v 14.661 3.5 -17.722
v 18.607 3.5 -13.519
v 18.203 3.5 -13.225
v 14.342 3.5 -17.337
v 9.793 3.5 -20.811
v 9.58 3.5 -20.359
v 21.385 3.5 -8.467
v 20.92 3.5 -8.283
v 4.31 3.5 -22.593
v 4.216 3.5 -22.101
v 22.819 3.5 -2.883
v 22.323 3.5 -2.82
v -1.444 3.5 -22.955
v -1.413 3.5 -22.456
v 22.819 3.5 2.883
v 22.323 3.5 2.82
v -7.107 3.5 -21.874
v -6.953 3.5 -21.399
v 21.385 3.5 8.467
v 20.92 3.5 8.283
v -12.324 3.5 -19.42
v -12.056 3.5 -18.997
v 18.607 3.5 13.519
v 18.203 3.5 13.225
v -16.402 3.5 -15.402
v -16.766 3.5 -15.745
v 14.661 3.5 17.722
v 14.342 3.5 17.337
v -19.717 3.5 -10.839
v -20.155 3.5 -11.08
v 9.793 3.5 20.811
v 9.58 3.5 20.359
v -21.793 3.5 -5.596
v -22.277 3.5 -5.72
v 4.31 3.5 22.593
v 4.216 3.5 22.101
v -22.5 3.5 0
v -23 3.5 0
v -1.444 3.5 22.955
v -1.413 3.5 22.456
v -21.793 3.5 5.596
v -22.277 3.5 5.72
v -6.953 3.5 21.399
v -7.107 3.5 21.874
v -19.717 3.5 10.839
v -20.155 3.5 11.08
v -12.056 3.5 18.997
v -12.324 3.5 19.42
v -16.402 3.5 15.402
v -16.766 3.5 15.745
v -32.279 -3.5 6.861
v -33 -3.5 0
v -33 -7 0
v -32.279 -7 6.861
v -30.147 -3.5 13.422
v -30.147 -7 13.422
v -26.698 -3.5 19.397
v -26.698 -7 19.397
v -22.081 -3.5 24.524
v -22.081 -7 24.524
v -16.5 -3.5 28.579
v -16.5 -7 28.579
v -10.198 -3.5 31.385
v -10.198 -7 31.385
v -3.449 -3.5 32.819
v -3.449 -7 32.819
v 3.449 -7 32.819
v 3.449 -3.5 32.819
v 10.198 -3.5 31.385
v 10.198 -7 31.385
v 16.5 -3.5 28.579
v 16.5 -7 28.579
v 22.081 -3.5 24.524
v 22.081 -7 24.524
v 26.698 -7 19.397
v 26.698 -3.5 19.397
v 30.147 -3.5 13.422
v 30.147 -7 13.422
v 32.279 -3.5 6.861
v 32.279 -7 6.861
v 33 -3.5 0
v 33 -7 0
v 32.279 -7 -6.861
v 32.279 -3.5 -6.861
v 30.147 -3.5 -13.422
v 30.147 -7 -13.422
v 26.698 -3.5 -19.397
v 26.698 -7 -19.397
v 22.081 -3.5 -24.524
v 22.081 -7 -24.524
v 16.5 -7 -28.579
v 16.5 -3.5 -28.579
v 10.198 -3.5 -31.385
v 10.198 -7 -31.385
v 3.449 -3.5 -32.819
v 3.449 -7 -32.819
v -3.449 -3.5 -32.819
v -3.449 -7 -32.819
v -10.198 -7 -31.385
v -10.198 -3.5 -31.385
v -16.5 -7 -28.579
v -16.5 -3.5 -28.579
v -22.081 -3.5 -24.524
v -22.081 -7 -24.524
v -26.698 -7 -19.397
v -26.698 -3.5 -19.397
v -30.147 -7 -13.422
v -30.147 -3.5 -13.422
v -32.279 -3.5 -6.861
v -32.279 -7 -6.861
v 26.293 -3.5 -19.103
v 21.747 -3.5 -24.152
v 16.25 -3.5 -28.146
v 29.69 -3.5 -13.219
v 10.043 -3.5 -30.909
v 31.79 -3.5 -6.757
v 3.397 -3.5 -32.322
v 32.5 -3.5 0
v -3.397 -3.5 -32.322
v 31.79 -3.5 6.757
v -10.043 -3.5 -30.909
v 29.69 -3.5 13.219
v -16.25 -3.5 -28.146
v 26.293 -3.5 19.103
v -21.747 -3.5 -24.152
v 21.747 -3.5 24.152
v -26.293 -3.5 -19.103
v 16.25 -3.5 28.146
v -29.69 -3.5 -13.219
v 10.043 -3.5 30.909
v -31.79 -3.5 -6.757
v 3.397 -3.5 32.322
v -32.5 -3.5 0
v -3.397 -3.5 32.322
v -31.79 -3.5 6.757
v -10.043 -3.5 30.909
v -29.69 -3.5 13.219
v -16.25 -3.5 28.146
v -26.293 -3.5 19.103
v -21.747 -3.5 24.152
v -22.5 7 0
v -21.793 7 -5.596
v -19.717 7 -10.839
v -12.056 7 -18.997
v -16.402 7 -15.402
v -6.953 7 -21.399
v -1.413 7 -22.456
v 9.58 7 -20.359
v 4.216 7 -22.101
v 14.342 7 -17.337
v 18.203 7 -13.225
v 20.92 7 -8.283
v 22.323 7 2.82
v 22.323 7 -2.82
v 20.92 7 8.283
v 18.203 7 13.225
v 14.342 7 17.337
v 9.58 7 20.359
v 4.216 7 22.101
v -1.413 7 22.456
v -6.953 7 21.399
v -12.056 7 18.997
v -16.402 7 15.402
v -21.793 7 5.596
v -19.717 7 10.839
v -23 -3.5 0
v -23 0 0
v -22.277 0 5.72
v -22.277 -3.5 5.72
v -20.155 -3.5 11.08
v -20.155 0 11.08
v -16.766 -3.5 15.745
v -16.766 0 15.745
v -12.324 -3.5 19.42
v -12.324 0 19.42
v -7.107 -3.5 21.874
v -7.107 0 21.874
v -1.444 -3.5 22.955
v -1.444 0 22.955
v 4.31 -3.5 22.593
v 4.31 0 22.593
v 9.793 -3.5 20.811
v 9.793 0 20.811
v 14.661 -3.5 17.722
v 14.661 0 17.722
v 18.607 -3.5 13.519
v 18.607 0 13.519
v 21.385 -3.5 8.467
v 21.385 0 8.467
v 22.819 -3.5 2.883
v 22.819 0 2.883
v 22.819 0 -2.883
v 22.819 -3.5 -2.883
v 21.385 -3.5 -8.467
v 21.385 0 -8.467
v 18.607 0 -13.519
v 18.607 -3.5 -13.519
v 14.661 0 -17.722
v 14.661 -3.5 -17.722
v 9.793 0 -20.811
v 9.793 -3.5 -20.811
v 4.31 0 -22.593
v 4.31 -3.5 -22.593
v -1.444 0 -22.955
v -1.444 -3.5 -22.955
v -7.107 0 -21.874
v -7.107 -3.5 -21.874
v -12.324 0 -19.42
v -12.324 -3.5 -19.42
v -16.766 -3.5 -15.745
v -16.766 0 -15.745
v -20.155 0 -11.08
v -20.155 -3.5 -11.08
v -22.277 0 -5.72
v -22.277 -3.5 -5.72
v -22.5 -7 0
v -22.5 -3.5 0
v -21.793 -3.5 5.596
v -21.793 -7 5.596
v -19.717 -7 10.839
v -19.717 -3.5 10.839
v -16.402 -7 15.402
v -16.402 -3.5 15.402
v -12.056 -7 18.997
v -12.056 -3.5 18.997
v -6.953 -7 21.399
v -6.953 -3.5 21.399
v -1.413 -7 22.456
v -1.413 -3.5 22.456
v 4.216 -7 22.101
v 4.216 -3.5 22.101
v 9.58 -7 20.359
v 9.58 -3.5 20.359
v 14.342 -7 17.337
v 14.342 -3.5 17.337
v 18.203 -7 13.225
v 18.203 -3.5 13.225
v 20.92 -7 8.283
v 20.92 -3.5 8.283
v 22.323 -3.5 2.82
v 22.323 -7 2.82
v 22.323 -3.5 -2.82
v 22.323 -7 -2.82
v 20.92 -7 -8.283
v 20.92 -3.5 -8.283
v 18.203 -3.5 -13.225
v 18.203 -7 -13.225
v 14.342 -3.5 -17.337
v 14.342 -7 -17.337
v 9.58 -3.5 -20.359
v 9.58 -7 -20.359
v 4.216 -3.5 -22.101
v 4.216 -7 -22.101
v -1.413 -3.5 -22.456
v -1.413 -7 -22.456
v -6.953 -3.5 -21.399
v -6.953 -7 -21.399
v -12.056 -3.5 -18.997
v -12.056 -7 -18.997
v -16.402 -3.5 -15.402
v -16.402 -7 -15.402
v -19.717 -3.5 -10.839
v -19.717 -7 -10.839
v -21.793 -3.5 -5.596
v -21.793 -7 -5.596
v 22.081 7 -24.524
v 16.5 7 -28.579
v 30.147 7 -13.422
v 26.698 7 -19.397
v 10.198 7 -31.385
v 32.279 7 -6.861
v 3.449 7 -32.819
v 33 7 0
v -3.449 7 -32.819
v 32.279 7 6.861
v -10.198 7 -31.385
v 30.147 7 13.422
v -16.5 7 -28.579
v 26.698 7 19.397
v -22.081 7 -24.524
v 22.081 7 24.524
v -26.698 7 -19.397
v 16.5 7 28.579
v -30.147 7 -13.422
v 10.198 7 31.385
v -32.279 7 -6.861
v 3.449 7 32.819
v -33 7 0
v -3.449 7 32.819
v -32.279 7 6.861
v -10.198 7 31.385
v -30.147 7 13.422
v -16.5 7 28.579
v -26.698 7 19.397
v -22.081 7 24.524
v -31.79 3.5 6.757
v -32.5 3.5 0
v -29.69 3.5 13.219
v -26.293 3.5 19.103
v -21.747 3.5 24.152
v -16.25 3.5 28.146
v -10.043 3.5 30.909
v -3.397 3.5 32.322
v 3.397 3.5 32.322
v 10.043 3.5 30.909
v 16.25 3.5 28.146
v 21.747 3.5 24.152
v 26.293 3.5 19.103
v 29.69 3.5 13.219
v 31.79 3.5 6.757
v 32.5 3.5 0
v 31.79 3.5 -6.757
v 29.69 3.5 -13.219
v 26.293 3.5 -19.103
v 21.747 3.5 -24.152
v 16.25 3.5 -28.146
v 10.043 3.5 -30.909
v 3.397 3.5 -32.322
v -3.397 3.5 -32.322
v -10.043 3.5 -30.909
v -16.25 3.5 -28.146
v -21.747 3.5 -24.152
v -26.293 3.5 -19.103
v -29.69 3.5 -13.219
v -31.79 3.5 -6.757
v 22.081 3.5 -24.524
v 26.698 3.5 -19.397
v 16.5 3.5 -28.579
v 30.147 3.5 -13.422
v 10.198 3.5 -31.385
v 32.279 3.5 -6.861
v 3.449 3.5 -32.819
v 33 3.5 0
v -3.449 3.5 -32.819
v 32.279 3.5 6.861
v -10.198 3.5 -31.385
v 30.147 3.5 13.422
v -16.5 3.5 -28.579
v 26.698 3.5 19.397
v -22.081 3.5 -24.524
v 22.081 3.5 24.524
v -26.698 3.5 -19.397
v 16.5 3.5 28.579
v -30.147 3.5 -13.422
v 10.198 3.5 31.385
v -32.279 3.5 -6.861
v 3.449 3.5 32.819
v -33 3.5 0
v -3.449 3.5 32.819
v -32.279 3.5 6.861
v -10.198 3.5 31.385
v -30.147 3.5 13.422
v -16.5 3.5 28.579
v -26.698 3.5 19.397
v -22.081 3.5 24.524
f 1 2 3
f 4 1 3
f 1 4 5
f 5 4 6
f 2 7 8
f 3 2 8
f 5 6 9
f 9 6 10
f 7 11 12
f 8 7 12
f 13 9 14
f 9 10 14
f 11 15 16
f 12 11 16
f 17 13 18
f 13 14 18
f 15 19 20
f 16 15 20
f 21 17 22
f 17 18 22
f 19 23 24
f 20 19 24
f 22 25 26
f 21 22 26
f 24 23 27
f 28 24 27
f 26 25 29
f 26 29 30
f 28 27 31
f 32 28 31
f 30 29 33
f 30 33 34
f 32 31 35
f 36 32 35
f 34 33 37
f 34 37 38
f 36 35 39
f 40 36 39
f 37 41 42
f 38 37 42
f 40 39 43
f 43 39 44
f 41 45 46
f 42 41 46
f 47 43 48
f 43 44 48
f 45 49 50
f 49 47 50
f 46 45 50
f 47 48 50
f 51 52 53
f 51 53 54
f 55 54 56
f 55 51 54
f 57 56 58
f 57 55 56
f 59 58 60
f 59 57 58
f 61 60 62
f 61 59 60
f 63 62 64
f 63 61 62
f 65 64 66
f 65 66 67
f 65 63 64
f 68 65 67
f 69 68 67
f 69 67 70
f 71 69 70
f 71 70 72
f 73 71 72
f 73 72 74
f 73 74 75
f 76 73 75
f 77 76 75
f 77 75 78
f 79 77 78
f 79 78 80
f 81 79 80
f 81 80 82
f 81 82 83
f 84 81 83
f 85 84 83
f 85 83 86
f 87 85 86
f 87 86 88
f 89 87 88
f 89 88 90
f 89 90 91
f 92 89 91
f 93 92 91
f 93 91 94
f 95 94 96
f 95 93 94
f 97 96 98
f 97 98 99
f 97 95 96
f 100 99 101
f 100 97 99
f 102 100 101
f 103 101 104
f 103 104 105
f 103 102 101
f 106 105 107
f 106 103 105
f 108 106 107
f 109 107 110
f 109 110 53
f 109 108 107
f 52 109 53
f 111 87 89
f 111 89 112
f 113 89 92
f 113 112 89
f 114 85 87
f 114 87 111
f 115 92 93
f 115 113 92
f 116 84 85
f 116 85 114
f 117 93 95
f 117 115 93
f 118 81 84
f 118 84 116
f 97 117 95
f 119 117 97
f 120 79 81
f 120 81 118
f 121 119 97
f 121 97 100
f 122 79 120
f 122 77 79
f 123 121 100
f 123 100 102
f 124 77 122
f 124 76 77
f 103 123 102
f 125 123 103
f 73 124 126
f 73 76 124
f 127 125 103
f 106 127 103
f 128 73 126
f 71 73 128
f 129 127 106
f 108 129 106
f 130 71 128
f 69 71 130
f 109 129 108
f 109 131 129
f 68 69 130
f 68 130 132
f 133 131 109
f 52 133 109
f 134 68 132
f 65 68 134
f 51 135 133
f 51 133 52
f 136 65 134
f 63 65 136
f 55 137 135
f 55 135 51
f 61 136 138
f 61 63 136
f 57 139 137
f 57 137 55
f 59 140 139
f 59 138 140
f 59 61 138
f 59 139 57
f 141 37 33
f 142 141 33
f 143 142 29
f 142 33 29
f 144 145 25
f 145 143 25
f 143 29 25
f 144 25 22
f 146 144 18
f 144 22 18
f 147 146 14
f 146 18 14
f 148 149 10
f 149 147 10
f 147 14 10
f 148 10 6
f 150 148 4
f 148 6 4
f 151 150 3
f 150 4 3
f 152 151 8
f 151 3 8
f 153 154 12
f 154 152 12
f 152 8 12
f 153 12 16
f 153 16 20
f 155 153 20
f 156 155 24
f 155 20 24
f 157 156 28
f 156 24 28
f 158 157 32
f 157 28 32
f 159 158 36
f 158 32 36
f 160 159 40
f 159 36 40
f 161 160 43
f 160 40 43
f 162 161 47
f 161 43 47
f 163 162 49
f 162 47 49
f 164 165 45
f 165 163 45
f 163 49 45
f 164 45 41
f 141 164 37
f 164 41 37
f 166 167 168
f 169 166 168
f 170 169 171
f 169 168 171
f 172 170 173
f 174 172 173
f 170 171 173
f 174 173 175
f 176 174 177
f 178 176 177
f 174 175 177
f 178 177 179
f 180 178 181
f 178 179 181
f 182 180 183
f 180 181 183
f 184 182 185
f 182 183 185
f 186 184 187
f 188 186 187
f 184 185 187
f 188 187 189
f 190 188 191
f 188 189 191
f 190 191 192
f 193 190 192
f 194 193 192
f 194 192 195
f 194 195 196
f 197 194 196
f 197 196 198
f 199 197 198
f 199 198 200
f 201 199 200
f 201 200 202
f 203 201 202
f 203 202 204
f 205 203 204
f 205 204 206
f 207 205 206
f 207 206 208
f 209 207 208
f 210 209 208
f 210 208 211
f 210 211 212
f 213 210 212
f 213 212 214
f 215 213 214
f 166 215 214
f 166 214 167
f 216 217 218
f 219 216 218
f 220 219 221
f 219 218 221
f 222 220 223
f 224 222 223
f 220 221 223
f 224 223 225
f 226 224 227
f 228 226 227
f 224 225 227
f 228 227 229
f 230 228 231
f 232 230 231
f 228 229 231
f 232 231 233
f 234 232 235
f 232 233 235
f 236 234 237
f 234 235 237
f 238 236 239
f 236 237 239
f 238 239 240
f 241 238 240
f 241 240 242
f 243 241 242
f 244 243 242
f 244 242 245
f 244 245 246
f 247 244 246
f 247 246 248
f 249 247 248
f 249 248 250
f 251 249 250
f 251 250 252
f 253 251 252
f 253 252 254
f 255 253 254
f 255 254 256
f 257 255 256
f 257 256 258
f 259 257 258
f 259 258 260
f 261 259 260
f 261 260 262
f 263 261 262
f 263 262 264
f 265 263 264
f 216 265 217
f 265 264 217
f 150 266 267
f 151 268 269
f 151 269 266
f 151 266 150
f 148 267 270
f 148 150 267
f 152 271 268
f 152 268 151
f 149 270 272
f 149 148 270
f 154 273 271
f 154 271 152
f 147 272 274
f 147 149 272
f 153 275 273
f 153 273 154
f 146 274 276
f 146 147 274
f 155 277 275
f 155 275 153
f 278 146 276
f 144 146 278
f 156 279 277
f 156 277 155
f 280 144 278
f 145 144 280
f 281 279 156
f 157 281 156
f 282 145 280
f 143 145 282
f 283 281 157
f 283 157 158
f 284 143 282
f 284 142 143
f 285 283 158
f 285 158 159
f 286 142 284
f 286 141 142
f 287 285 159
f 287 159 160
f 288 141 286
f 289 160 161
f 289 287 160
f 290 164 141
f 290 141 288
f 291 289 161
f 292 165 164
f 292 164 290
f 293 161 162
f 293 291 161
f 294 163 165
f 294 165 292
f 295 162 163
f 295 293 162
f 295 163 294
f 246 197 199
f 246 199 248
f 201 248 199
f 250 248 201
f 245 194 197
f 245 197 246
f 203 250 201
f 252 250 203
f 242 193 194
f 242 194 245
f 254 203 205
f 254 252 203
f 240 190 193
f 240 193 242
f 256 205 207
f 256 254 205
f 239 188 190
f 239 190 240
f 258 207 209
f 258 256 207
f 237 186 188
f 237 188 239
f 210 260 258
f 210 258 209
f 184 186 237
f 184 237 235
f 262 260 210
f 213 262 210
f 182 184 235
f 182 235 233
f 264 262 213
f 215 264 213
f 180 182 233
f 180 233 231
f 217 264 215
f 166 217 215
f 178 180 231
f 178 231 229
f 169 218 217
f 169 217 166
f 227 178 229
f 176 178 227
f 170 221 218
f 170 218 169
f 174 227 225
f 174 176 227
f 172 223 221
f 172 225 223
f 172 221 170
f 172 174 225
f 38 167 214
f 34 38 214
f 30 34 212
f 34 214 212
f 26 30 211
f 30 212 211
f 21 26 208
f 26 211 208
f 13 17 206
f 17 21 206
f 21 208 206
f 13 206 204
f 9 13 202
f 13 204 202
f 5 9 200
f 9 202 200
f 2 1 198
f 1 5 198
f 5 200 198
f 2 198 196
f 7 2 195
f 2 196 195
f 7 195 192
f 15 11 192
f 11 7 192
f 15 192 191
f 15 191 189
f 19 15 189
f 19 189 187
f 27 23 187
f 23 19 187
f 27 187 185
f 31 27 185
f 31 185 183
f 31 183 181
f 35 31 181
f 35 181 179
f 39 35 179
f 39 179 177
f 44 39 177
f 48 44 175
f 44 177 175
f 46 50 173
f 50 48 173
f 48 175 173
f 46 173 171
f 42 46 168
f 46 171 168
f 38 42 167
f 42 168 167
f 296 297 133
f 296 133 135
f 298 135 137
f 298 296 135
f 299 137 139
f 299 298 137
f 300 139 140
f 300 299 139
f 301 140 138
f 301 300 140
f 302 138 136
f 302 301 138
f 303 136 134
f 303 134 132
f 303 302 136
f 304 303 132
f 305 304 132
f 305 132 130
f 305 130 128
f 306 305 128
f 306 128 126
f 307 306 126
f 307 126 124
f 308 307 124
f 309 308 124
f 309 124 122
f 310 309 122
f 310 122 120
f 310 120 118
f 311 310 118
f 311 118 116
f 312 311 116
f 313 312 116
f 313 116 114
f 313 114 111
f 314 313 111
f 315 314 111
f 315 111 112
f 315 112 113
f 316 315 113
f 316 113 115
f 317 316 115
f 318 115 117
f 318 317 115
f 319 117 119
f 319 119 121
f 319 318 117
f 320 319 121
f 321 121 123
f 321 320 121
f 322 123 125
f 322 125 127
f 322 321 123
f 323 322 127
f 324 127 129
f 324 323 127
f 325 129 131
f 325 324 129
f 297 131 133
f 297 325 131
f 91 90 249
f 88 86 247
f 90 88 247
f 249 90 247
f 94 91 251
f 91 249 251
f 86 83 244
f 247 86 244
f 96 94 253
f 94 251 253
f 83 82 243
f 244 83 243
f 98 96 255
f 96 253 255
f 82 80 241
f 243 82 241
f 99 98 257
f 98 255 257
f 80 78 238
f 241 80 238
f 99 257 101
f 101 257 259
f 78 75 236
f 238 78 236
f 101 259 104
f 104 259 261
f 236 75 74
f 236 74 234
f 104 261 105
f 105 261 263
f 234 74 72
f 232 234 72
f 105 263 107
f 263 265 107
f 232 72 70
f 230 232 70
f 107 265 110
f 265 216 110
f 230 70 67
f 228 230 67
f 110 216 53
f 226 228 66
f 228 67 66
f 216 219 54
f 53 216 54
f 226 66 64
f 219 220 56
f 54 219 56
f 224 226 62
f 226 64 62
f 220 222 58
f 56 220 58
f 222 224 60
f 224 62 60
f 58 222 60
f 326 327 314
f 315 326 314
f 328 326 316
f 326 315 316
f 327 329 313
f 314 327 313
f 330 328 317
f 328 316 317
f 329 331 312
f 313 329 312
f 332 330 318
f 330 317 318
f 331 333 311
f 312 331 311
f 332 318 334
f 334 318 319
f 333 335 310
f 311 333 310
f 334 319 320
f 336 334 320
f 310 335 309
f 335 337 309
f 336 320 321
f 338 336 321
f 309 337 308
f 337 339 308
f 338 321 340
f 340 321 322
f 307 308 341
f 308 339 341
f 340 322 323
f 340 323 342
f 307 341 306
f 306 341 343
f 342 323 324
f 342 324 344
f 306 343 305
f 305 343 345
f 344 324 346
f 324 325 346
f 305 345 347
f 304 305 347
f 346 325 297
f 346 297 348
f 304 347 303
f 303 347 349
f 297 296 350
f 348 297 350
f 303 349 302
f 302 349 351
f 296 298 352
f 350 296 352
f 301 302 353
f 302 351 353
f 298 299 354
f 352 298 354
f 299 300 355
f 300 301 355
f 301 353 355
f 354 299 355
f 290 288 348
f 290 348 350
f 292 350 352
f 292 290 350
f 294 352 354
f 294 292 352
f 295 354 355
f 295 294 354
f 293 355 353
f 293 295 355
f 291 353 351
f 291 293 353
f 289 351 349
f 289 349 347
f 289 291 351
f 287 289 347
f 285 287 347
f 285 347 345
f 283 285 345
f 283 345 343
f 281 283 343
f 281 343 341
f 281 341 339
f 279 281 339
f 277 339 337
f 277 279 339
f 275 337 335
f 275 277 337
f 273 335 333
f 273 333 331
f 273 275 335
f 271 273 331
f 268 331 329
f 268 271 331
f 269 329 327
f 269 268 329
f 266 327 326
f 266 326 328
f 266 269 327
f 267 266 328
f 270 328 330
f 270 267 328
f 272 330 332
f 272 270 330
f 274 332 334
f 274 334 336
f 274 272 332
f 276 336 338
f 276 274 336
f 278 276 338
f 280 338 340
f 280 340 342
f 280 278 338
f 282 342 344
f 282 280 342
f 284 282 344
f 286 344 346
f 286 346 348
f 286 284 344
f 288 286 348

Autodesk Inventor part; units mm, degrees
ref_plane "YZ Plane" through (0, 0, 0) normal (1, 0, 0) x (0, 1, 0)
ref_plane "XZ Plane" through (0, 0, 0) normal (0, 1, 0) x (-1, 0, 0)
ref_plane "XY Plane" through (0, 0, 0) normal (0, 0, 1) x (1, 0, 0)
sketch "Sketch1" plane through (0, 0, 0) normal (0, 1, 0) x (-1, 0, 0)
  circle A0 centre (0, 0) radius 22.5
  circle A1 centre (0, 0) radius 33
  circle A2 centre (0, 0) radius 23
  circle A3 centre (0, 0) radius 32.5
  dimension "d0" = 45
  dimension "d1" = 66
  dimension "d2" = 0.5
  dimension "d3" = 0.5
extrude "Extrusion1" add sketch "Sketch1" along normal mid plane 14 contours A1 | A2 | A3
extrude "Extrusion2" cut sketch "Sketch1" along normal mid plane 7
properties part number "Thrust Bearing 51109 - 45x66x14mm" material "Stainless Steel"
